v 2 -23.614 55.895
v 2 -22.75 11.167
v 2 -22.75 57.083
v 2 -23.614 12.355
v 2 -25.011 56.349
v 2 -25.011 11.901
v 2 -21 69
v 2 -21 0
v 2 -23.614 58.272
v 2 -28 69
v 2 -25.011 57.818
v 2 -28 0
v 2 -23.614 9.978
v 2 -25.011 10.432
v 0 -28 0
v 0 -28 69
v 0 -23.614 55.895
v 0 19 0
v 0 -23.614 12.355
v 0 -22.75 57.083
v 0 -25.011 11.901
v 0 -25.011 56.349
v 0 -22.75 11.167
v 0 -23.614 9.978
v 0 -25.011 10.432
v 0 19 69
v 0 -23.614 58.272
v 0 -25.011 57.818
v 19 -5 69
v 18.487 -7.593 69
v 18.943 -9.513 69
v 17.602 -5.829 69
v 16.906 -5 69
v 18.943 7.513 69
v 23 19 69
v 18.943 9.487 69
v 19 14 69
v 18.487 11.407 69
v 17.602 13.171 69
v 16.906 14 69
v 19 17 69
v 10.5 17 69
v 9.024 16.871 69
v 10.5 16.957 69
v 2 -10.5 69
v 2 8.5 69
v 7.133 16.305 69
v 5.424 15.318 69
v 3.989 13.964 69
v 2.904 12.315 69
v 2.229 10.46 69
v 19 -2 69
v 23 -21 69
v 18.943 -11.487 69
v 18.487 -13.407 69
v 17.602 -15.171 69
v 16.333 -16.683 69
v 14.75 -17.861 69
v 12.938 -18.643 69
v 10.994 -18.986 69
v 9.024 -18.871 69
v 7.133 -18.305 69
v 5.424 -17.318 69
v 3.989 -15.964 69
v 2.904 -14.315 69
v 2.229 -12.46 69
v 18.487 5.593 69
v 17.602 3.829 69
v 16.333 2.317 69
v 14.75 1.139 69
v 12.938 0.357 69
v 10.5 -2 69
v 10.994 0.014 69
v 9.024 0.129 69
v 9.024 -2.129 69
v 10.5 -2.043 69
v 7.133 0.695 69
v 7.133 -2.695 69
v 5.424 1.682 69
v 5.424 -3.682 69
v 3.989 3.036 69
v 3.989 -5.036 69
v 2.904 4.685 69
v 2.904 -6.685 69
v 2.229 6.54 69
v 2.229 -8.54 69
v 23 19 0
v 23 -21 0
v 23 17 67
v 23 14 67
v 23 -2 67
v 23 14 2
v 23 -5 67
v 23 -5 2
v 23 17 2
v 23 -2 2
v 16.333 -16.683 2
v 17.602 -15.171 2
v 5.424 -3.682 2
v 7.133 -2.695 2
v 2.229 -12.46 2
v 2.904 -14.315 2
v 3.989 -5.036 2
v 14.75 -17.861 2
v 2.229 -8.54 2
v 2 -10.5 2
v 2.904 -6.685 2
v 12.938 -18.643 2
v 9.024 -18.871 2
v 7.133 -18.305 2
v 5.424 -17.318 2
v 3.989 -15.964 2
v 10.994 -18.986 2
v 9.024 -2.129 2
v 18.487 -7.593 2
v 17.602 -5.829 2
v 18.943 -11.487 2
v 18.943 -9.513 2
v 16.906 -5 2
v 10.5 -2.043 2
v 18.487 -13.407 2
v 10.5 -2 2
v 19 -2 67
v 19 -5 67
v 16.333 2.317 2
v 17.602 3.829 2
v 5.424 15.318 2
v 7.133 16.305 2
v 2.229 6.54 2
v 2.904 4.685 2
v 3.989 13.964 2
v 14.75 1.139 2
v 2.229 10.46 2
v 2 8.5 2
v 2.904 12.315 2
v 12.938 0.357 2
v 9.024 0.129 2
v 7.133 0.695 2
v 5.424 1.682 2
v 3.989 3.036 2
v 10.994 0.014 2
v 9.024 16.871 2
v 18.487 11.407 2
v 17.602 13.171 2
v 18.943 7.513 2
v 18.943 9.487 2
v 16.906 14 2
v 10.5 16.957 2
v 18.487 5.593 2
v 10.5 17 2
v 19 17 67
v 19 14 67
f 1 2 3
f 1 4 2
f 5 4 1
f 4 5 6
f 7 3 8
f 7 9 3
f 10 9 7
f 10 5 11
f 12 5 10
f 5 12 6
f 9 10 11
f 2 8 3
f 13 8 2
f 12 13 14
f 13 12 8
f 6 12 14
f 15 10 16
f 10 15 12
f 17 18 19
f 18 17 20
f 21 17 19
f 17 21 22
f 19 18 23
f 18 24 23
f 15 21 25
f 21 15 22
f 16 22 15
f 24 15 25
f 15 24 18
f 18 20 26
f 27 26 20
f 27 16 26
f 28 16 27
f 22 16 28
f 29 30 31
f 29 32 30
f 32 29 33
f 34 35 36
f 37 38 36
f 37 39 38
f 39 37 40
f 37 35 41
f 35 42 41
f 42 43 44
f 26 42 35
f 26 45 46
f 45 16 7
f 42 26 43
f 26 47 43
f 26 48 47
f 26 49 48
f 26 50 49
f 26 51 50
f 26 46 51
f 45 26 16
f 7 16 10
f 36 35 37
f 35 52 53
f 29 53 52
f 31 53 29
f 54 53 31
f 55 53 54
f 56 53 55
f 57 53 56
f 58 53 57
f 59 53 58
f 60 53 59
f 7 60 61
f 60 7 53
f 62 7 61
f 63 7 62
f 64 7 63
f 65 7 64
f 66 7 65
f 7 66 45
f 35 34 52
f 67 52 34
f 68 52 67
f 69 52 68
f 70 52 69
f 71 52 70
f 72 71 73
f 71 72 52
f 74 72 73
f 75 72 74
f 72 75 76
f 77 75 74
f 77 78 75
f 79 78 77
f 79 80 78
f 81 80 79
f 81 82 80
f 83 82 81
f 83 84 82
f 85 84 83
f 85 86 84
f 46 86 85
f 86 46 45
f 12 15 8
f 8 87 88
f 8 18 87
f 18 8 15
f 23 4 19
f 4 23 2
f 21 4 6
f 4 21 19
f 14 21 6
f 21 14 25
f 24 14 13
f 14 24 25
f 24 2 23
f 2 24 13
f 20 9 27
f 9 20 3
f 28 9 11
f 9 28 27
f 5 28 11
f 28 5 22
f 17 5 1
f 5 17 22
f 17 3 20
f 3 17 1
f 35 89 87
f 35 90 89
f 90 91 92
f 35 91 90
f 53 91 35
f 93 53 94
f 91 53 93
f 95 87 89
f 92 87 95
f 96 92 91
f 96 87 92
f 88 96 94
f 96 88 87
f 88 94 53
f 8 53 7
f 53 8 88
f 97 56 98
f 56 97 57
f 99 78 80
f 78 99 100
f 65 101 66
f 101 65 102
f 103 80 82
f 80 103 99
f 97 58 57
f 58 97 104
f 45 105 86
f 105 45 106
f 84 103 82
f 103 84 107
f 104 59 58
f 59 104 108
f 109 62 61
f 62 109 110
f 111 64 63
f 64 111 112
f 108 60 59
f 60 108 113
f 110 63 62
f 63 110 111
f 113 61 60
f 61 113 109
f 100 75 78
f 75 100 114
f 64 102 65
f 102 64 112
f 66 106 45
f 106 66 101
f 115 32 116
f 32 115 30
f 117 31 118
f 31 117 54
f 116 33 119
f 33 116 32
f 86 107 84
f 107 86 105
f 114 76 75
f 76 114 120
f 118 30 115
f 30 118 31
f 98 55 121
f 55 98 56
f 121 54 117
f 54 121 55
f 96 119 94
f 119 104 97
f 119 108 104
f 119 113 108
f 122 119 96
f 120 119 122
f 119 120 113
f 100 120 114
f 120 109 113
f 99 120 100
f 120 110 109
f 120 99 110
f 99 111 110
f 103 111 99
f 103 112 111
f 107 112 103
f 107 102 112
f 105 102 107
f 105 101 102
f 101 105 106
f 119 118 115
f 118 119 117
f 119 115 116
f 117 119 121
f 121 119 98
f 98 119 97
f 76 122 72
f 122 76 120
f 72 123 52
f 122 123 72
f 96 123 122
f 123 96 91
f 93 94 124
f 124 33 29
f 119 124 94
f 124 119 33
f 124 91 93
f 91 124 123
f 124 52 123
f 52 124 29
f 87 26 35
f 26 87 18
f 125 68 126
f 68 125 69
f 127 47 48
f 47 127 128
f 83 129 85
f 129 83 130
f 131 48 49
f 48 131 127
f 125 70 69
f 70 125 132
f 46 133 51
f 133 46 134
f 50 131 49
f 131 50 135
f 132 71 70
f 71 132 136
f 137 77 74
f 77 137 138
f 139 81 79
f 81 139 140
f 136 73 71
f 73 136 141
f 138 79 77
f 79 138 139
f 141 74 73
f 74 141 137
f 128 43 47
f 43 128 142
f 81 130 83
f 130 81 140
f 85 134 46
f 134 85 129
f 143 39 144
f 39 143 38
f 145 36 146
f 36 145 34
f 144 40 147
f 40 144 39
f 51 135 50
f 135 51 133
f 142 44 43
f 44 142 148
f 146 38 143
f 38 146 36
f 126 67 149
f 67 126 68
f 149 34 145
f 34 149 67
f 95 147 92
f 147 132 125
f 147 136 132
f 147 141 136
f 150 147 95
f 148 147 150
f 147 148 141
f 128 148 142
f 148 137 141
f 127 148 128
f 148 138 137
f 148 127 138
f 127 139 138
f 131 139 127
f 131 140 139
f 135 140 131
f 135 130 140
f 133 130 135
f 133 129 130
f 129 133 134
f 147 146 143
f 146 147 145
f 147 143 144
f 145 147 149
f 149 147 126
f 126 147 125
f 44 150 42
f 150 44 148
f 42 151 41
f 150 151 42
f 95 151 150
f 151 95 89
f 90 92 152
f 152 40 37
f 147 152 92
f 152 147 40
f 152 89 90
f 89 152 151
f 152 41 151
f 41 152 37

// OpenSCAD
strip_width=65; //65
storage_diameter=17; //17
component_diameter=3; //3
wall_mounting_thickness=2; //2
length_of_feed=2; //2
length_of_endcap=0;  //0
n=2; //5
wall_mounting=true; //true
module holder()
{
difference()
{
	cube([storage_diameter+wall_mounting_thickness*2+length_of_feed, strip_width+wall_mounting_thickness*2+length_of_endcap, storage_diameter+wall_mounting_thickness*2]);
	translate([wall_mounting_thickness+storage_diameter/2, wall_mounting_thickness, wall_mounting_thickness+storage_diameter/2])
	{
		rotate(a=[90,0,180]){
			cylinder(h=strip_width+length_of_endcap+wall_mounting_thickness+1, r=storage_diameter/2);
		}
	}
	translate([storage_diameter+wall_mounting_thickness*2+length_of_feed,wall_mounting_thickness,component_diameter+wall_mounting_thickness])
	{
		rotate(a=[0,180,0]) {
			cube([length_of_feed+wall_mounting_thickness+storage_diameter/2,strip_width, component_diameter]);
		}
	}
	translate([storage_diameter/2+wall_mounting_thickness,wall_mounting_thickness+strip_width,wall_mounting_thickness])
	{
		rotate(a=[0,0,0]) {
			cube([storage_diameter/2,length_of_endcap+wall_mounting_thickness, component_diameter]);
		}
	}
}
} 

module wall_mounting()
{
difference()
{
	translate([0,0,component_diameter+storage_diameter])
	{
		cube([wall_mounting_thickness, strip_width+wall_mounting_thickness*2+length_of_endcap, 8]);
	}


	translate([-.5,(strip_width+wall_mounting_thickness+length_of_endcap)/6, 4+component_diameter+storage_diameter])
	{
		rotate([0,90,0])
		{
			cylinder(h=wall_mounting_thickness+1, r=2.5/2);
		}
	}
	translate([-.5,((strip_width+wall_mounting_thickness+length_of_endcap)*5/6)+2.5/2, 4+component_diameter+storage_diameter])
	{
		rotate([0,90,0])
		{
			cylinder(h=wall_mounting_thickness+1, r=2.5/2);
		}
	}

}	
}
rotate(a=[90,0,0]){
if (wall_mounting==true)
{
	wall_mounting();
}
for (i=[0:n-1])
{
	translate([0,0,-i*(storage_diameter+wall_mounting_thickness)])
	{
	holder();
	}
}
}
